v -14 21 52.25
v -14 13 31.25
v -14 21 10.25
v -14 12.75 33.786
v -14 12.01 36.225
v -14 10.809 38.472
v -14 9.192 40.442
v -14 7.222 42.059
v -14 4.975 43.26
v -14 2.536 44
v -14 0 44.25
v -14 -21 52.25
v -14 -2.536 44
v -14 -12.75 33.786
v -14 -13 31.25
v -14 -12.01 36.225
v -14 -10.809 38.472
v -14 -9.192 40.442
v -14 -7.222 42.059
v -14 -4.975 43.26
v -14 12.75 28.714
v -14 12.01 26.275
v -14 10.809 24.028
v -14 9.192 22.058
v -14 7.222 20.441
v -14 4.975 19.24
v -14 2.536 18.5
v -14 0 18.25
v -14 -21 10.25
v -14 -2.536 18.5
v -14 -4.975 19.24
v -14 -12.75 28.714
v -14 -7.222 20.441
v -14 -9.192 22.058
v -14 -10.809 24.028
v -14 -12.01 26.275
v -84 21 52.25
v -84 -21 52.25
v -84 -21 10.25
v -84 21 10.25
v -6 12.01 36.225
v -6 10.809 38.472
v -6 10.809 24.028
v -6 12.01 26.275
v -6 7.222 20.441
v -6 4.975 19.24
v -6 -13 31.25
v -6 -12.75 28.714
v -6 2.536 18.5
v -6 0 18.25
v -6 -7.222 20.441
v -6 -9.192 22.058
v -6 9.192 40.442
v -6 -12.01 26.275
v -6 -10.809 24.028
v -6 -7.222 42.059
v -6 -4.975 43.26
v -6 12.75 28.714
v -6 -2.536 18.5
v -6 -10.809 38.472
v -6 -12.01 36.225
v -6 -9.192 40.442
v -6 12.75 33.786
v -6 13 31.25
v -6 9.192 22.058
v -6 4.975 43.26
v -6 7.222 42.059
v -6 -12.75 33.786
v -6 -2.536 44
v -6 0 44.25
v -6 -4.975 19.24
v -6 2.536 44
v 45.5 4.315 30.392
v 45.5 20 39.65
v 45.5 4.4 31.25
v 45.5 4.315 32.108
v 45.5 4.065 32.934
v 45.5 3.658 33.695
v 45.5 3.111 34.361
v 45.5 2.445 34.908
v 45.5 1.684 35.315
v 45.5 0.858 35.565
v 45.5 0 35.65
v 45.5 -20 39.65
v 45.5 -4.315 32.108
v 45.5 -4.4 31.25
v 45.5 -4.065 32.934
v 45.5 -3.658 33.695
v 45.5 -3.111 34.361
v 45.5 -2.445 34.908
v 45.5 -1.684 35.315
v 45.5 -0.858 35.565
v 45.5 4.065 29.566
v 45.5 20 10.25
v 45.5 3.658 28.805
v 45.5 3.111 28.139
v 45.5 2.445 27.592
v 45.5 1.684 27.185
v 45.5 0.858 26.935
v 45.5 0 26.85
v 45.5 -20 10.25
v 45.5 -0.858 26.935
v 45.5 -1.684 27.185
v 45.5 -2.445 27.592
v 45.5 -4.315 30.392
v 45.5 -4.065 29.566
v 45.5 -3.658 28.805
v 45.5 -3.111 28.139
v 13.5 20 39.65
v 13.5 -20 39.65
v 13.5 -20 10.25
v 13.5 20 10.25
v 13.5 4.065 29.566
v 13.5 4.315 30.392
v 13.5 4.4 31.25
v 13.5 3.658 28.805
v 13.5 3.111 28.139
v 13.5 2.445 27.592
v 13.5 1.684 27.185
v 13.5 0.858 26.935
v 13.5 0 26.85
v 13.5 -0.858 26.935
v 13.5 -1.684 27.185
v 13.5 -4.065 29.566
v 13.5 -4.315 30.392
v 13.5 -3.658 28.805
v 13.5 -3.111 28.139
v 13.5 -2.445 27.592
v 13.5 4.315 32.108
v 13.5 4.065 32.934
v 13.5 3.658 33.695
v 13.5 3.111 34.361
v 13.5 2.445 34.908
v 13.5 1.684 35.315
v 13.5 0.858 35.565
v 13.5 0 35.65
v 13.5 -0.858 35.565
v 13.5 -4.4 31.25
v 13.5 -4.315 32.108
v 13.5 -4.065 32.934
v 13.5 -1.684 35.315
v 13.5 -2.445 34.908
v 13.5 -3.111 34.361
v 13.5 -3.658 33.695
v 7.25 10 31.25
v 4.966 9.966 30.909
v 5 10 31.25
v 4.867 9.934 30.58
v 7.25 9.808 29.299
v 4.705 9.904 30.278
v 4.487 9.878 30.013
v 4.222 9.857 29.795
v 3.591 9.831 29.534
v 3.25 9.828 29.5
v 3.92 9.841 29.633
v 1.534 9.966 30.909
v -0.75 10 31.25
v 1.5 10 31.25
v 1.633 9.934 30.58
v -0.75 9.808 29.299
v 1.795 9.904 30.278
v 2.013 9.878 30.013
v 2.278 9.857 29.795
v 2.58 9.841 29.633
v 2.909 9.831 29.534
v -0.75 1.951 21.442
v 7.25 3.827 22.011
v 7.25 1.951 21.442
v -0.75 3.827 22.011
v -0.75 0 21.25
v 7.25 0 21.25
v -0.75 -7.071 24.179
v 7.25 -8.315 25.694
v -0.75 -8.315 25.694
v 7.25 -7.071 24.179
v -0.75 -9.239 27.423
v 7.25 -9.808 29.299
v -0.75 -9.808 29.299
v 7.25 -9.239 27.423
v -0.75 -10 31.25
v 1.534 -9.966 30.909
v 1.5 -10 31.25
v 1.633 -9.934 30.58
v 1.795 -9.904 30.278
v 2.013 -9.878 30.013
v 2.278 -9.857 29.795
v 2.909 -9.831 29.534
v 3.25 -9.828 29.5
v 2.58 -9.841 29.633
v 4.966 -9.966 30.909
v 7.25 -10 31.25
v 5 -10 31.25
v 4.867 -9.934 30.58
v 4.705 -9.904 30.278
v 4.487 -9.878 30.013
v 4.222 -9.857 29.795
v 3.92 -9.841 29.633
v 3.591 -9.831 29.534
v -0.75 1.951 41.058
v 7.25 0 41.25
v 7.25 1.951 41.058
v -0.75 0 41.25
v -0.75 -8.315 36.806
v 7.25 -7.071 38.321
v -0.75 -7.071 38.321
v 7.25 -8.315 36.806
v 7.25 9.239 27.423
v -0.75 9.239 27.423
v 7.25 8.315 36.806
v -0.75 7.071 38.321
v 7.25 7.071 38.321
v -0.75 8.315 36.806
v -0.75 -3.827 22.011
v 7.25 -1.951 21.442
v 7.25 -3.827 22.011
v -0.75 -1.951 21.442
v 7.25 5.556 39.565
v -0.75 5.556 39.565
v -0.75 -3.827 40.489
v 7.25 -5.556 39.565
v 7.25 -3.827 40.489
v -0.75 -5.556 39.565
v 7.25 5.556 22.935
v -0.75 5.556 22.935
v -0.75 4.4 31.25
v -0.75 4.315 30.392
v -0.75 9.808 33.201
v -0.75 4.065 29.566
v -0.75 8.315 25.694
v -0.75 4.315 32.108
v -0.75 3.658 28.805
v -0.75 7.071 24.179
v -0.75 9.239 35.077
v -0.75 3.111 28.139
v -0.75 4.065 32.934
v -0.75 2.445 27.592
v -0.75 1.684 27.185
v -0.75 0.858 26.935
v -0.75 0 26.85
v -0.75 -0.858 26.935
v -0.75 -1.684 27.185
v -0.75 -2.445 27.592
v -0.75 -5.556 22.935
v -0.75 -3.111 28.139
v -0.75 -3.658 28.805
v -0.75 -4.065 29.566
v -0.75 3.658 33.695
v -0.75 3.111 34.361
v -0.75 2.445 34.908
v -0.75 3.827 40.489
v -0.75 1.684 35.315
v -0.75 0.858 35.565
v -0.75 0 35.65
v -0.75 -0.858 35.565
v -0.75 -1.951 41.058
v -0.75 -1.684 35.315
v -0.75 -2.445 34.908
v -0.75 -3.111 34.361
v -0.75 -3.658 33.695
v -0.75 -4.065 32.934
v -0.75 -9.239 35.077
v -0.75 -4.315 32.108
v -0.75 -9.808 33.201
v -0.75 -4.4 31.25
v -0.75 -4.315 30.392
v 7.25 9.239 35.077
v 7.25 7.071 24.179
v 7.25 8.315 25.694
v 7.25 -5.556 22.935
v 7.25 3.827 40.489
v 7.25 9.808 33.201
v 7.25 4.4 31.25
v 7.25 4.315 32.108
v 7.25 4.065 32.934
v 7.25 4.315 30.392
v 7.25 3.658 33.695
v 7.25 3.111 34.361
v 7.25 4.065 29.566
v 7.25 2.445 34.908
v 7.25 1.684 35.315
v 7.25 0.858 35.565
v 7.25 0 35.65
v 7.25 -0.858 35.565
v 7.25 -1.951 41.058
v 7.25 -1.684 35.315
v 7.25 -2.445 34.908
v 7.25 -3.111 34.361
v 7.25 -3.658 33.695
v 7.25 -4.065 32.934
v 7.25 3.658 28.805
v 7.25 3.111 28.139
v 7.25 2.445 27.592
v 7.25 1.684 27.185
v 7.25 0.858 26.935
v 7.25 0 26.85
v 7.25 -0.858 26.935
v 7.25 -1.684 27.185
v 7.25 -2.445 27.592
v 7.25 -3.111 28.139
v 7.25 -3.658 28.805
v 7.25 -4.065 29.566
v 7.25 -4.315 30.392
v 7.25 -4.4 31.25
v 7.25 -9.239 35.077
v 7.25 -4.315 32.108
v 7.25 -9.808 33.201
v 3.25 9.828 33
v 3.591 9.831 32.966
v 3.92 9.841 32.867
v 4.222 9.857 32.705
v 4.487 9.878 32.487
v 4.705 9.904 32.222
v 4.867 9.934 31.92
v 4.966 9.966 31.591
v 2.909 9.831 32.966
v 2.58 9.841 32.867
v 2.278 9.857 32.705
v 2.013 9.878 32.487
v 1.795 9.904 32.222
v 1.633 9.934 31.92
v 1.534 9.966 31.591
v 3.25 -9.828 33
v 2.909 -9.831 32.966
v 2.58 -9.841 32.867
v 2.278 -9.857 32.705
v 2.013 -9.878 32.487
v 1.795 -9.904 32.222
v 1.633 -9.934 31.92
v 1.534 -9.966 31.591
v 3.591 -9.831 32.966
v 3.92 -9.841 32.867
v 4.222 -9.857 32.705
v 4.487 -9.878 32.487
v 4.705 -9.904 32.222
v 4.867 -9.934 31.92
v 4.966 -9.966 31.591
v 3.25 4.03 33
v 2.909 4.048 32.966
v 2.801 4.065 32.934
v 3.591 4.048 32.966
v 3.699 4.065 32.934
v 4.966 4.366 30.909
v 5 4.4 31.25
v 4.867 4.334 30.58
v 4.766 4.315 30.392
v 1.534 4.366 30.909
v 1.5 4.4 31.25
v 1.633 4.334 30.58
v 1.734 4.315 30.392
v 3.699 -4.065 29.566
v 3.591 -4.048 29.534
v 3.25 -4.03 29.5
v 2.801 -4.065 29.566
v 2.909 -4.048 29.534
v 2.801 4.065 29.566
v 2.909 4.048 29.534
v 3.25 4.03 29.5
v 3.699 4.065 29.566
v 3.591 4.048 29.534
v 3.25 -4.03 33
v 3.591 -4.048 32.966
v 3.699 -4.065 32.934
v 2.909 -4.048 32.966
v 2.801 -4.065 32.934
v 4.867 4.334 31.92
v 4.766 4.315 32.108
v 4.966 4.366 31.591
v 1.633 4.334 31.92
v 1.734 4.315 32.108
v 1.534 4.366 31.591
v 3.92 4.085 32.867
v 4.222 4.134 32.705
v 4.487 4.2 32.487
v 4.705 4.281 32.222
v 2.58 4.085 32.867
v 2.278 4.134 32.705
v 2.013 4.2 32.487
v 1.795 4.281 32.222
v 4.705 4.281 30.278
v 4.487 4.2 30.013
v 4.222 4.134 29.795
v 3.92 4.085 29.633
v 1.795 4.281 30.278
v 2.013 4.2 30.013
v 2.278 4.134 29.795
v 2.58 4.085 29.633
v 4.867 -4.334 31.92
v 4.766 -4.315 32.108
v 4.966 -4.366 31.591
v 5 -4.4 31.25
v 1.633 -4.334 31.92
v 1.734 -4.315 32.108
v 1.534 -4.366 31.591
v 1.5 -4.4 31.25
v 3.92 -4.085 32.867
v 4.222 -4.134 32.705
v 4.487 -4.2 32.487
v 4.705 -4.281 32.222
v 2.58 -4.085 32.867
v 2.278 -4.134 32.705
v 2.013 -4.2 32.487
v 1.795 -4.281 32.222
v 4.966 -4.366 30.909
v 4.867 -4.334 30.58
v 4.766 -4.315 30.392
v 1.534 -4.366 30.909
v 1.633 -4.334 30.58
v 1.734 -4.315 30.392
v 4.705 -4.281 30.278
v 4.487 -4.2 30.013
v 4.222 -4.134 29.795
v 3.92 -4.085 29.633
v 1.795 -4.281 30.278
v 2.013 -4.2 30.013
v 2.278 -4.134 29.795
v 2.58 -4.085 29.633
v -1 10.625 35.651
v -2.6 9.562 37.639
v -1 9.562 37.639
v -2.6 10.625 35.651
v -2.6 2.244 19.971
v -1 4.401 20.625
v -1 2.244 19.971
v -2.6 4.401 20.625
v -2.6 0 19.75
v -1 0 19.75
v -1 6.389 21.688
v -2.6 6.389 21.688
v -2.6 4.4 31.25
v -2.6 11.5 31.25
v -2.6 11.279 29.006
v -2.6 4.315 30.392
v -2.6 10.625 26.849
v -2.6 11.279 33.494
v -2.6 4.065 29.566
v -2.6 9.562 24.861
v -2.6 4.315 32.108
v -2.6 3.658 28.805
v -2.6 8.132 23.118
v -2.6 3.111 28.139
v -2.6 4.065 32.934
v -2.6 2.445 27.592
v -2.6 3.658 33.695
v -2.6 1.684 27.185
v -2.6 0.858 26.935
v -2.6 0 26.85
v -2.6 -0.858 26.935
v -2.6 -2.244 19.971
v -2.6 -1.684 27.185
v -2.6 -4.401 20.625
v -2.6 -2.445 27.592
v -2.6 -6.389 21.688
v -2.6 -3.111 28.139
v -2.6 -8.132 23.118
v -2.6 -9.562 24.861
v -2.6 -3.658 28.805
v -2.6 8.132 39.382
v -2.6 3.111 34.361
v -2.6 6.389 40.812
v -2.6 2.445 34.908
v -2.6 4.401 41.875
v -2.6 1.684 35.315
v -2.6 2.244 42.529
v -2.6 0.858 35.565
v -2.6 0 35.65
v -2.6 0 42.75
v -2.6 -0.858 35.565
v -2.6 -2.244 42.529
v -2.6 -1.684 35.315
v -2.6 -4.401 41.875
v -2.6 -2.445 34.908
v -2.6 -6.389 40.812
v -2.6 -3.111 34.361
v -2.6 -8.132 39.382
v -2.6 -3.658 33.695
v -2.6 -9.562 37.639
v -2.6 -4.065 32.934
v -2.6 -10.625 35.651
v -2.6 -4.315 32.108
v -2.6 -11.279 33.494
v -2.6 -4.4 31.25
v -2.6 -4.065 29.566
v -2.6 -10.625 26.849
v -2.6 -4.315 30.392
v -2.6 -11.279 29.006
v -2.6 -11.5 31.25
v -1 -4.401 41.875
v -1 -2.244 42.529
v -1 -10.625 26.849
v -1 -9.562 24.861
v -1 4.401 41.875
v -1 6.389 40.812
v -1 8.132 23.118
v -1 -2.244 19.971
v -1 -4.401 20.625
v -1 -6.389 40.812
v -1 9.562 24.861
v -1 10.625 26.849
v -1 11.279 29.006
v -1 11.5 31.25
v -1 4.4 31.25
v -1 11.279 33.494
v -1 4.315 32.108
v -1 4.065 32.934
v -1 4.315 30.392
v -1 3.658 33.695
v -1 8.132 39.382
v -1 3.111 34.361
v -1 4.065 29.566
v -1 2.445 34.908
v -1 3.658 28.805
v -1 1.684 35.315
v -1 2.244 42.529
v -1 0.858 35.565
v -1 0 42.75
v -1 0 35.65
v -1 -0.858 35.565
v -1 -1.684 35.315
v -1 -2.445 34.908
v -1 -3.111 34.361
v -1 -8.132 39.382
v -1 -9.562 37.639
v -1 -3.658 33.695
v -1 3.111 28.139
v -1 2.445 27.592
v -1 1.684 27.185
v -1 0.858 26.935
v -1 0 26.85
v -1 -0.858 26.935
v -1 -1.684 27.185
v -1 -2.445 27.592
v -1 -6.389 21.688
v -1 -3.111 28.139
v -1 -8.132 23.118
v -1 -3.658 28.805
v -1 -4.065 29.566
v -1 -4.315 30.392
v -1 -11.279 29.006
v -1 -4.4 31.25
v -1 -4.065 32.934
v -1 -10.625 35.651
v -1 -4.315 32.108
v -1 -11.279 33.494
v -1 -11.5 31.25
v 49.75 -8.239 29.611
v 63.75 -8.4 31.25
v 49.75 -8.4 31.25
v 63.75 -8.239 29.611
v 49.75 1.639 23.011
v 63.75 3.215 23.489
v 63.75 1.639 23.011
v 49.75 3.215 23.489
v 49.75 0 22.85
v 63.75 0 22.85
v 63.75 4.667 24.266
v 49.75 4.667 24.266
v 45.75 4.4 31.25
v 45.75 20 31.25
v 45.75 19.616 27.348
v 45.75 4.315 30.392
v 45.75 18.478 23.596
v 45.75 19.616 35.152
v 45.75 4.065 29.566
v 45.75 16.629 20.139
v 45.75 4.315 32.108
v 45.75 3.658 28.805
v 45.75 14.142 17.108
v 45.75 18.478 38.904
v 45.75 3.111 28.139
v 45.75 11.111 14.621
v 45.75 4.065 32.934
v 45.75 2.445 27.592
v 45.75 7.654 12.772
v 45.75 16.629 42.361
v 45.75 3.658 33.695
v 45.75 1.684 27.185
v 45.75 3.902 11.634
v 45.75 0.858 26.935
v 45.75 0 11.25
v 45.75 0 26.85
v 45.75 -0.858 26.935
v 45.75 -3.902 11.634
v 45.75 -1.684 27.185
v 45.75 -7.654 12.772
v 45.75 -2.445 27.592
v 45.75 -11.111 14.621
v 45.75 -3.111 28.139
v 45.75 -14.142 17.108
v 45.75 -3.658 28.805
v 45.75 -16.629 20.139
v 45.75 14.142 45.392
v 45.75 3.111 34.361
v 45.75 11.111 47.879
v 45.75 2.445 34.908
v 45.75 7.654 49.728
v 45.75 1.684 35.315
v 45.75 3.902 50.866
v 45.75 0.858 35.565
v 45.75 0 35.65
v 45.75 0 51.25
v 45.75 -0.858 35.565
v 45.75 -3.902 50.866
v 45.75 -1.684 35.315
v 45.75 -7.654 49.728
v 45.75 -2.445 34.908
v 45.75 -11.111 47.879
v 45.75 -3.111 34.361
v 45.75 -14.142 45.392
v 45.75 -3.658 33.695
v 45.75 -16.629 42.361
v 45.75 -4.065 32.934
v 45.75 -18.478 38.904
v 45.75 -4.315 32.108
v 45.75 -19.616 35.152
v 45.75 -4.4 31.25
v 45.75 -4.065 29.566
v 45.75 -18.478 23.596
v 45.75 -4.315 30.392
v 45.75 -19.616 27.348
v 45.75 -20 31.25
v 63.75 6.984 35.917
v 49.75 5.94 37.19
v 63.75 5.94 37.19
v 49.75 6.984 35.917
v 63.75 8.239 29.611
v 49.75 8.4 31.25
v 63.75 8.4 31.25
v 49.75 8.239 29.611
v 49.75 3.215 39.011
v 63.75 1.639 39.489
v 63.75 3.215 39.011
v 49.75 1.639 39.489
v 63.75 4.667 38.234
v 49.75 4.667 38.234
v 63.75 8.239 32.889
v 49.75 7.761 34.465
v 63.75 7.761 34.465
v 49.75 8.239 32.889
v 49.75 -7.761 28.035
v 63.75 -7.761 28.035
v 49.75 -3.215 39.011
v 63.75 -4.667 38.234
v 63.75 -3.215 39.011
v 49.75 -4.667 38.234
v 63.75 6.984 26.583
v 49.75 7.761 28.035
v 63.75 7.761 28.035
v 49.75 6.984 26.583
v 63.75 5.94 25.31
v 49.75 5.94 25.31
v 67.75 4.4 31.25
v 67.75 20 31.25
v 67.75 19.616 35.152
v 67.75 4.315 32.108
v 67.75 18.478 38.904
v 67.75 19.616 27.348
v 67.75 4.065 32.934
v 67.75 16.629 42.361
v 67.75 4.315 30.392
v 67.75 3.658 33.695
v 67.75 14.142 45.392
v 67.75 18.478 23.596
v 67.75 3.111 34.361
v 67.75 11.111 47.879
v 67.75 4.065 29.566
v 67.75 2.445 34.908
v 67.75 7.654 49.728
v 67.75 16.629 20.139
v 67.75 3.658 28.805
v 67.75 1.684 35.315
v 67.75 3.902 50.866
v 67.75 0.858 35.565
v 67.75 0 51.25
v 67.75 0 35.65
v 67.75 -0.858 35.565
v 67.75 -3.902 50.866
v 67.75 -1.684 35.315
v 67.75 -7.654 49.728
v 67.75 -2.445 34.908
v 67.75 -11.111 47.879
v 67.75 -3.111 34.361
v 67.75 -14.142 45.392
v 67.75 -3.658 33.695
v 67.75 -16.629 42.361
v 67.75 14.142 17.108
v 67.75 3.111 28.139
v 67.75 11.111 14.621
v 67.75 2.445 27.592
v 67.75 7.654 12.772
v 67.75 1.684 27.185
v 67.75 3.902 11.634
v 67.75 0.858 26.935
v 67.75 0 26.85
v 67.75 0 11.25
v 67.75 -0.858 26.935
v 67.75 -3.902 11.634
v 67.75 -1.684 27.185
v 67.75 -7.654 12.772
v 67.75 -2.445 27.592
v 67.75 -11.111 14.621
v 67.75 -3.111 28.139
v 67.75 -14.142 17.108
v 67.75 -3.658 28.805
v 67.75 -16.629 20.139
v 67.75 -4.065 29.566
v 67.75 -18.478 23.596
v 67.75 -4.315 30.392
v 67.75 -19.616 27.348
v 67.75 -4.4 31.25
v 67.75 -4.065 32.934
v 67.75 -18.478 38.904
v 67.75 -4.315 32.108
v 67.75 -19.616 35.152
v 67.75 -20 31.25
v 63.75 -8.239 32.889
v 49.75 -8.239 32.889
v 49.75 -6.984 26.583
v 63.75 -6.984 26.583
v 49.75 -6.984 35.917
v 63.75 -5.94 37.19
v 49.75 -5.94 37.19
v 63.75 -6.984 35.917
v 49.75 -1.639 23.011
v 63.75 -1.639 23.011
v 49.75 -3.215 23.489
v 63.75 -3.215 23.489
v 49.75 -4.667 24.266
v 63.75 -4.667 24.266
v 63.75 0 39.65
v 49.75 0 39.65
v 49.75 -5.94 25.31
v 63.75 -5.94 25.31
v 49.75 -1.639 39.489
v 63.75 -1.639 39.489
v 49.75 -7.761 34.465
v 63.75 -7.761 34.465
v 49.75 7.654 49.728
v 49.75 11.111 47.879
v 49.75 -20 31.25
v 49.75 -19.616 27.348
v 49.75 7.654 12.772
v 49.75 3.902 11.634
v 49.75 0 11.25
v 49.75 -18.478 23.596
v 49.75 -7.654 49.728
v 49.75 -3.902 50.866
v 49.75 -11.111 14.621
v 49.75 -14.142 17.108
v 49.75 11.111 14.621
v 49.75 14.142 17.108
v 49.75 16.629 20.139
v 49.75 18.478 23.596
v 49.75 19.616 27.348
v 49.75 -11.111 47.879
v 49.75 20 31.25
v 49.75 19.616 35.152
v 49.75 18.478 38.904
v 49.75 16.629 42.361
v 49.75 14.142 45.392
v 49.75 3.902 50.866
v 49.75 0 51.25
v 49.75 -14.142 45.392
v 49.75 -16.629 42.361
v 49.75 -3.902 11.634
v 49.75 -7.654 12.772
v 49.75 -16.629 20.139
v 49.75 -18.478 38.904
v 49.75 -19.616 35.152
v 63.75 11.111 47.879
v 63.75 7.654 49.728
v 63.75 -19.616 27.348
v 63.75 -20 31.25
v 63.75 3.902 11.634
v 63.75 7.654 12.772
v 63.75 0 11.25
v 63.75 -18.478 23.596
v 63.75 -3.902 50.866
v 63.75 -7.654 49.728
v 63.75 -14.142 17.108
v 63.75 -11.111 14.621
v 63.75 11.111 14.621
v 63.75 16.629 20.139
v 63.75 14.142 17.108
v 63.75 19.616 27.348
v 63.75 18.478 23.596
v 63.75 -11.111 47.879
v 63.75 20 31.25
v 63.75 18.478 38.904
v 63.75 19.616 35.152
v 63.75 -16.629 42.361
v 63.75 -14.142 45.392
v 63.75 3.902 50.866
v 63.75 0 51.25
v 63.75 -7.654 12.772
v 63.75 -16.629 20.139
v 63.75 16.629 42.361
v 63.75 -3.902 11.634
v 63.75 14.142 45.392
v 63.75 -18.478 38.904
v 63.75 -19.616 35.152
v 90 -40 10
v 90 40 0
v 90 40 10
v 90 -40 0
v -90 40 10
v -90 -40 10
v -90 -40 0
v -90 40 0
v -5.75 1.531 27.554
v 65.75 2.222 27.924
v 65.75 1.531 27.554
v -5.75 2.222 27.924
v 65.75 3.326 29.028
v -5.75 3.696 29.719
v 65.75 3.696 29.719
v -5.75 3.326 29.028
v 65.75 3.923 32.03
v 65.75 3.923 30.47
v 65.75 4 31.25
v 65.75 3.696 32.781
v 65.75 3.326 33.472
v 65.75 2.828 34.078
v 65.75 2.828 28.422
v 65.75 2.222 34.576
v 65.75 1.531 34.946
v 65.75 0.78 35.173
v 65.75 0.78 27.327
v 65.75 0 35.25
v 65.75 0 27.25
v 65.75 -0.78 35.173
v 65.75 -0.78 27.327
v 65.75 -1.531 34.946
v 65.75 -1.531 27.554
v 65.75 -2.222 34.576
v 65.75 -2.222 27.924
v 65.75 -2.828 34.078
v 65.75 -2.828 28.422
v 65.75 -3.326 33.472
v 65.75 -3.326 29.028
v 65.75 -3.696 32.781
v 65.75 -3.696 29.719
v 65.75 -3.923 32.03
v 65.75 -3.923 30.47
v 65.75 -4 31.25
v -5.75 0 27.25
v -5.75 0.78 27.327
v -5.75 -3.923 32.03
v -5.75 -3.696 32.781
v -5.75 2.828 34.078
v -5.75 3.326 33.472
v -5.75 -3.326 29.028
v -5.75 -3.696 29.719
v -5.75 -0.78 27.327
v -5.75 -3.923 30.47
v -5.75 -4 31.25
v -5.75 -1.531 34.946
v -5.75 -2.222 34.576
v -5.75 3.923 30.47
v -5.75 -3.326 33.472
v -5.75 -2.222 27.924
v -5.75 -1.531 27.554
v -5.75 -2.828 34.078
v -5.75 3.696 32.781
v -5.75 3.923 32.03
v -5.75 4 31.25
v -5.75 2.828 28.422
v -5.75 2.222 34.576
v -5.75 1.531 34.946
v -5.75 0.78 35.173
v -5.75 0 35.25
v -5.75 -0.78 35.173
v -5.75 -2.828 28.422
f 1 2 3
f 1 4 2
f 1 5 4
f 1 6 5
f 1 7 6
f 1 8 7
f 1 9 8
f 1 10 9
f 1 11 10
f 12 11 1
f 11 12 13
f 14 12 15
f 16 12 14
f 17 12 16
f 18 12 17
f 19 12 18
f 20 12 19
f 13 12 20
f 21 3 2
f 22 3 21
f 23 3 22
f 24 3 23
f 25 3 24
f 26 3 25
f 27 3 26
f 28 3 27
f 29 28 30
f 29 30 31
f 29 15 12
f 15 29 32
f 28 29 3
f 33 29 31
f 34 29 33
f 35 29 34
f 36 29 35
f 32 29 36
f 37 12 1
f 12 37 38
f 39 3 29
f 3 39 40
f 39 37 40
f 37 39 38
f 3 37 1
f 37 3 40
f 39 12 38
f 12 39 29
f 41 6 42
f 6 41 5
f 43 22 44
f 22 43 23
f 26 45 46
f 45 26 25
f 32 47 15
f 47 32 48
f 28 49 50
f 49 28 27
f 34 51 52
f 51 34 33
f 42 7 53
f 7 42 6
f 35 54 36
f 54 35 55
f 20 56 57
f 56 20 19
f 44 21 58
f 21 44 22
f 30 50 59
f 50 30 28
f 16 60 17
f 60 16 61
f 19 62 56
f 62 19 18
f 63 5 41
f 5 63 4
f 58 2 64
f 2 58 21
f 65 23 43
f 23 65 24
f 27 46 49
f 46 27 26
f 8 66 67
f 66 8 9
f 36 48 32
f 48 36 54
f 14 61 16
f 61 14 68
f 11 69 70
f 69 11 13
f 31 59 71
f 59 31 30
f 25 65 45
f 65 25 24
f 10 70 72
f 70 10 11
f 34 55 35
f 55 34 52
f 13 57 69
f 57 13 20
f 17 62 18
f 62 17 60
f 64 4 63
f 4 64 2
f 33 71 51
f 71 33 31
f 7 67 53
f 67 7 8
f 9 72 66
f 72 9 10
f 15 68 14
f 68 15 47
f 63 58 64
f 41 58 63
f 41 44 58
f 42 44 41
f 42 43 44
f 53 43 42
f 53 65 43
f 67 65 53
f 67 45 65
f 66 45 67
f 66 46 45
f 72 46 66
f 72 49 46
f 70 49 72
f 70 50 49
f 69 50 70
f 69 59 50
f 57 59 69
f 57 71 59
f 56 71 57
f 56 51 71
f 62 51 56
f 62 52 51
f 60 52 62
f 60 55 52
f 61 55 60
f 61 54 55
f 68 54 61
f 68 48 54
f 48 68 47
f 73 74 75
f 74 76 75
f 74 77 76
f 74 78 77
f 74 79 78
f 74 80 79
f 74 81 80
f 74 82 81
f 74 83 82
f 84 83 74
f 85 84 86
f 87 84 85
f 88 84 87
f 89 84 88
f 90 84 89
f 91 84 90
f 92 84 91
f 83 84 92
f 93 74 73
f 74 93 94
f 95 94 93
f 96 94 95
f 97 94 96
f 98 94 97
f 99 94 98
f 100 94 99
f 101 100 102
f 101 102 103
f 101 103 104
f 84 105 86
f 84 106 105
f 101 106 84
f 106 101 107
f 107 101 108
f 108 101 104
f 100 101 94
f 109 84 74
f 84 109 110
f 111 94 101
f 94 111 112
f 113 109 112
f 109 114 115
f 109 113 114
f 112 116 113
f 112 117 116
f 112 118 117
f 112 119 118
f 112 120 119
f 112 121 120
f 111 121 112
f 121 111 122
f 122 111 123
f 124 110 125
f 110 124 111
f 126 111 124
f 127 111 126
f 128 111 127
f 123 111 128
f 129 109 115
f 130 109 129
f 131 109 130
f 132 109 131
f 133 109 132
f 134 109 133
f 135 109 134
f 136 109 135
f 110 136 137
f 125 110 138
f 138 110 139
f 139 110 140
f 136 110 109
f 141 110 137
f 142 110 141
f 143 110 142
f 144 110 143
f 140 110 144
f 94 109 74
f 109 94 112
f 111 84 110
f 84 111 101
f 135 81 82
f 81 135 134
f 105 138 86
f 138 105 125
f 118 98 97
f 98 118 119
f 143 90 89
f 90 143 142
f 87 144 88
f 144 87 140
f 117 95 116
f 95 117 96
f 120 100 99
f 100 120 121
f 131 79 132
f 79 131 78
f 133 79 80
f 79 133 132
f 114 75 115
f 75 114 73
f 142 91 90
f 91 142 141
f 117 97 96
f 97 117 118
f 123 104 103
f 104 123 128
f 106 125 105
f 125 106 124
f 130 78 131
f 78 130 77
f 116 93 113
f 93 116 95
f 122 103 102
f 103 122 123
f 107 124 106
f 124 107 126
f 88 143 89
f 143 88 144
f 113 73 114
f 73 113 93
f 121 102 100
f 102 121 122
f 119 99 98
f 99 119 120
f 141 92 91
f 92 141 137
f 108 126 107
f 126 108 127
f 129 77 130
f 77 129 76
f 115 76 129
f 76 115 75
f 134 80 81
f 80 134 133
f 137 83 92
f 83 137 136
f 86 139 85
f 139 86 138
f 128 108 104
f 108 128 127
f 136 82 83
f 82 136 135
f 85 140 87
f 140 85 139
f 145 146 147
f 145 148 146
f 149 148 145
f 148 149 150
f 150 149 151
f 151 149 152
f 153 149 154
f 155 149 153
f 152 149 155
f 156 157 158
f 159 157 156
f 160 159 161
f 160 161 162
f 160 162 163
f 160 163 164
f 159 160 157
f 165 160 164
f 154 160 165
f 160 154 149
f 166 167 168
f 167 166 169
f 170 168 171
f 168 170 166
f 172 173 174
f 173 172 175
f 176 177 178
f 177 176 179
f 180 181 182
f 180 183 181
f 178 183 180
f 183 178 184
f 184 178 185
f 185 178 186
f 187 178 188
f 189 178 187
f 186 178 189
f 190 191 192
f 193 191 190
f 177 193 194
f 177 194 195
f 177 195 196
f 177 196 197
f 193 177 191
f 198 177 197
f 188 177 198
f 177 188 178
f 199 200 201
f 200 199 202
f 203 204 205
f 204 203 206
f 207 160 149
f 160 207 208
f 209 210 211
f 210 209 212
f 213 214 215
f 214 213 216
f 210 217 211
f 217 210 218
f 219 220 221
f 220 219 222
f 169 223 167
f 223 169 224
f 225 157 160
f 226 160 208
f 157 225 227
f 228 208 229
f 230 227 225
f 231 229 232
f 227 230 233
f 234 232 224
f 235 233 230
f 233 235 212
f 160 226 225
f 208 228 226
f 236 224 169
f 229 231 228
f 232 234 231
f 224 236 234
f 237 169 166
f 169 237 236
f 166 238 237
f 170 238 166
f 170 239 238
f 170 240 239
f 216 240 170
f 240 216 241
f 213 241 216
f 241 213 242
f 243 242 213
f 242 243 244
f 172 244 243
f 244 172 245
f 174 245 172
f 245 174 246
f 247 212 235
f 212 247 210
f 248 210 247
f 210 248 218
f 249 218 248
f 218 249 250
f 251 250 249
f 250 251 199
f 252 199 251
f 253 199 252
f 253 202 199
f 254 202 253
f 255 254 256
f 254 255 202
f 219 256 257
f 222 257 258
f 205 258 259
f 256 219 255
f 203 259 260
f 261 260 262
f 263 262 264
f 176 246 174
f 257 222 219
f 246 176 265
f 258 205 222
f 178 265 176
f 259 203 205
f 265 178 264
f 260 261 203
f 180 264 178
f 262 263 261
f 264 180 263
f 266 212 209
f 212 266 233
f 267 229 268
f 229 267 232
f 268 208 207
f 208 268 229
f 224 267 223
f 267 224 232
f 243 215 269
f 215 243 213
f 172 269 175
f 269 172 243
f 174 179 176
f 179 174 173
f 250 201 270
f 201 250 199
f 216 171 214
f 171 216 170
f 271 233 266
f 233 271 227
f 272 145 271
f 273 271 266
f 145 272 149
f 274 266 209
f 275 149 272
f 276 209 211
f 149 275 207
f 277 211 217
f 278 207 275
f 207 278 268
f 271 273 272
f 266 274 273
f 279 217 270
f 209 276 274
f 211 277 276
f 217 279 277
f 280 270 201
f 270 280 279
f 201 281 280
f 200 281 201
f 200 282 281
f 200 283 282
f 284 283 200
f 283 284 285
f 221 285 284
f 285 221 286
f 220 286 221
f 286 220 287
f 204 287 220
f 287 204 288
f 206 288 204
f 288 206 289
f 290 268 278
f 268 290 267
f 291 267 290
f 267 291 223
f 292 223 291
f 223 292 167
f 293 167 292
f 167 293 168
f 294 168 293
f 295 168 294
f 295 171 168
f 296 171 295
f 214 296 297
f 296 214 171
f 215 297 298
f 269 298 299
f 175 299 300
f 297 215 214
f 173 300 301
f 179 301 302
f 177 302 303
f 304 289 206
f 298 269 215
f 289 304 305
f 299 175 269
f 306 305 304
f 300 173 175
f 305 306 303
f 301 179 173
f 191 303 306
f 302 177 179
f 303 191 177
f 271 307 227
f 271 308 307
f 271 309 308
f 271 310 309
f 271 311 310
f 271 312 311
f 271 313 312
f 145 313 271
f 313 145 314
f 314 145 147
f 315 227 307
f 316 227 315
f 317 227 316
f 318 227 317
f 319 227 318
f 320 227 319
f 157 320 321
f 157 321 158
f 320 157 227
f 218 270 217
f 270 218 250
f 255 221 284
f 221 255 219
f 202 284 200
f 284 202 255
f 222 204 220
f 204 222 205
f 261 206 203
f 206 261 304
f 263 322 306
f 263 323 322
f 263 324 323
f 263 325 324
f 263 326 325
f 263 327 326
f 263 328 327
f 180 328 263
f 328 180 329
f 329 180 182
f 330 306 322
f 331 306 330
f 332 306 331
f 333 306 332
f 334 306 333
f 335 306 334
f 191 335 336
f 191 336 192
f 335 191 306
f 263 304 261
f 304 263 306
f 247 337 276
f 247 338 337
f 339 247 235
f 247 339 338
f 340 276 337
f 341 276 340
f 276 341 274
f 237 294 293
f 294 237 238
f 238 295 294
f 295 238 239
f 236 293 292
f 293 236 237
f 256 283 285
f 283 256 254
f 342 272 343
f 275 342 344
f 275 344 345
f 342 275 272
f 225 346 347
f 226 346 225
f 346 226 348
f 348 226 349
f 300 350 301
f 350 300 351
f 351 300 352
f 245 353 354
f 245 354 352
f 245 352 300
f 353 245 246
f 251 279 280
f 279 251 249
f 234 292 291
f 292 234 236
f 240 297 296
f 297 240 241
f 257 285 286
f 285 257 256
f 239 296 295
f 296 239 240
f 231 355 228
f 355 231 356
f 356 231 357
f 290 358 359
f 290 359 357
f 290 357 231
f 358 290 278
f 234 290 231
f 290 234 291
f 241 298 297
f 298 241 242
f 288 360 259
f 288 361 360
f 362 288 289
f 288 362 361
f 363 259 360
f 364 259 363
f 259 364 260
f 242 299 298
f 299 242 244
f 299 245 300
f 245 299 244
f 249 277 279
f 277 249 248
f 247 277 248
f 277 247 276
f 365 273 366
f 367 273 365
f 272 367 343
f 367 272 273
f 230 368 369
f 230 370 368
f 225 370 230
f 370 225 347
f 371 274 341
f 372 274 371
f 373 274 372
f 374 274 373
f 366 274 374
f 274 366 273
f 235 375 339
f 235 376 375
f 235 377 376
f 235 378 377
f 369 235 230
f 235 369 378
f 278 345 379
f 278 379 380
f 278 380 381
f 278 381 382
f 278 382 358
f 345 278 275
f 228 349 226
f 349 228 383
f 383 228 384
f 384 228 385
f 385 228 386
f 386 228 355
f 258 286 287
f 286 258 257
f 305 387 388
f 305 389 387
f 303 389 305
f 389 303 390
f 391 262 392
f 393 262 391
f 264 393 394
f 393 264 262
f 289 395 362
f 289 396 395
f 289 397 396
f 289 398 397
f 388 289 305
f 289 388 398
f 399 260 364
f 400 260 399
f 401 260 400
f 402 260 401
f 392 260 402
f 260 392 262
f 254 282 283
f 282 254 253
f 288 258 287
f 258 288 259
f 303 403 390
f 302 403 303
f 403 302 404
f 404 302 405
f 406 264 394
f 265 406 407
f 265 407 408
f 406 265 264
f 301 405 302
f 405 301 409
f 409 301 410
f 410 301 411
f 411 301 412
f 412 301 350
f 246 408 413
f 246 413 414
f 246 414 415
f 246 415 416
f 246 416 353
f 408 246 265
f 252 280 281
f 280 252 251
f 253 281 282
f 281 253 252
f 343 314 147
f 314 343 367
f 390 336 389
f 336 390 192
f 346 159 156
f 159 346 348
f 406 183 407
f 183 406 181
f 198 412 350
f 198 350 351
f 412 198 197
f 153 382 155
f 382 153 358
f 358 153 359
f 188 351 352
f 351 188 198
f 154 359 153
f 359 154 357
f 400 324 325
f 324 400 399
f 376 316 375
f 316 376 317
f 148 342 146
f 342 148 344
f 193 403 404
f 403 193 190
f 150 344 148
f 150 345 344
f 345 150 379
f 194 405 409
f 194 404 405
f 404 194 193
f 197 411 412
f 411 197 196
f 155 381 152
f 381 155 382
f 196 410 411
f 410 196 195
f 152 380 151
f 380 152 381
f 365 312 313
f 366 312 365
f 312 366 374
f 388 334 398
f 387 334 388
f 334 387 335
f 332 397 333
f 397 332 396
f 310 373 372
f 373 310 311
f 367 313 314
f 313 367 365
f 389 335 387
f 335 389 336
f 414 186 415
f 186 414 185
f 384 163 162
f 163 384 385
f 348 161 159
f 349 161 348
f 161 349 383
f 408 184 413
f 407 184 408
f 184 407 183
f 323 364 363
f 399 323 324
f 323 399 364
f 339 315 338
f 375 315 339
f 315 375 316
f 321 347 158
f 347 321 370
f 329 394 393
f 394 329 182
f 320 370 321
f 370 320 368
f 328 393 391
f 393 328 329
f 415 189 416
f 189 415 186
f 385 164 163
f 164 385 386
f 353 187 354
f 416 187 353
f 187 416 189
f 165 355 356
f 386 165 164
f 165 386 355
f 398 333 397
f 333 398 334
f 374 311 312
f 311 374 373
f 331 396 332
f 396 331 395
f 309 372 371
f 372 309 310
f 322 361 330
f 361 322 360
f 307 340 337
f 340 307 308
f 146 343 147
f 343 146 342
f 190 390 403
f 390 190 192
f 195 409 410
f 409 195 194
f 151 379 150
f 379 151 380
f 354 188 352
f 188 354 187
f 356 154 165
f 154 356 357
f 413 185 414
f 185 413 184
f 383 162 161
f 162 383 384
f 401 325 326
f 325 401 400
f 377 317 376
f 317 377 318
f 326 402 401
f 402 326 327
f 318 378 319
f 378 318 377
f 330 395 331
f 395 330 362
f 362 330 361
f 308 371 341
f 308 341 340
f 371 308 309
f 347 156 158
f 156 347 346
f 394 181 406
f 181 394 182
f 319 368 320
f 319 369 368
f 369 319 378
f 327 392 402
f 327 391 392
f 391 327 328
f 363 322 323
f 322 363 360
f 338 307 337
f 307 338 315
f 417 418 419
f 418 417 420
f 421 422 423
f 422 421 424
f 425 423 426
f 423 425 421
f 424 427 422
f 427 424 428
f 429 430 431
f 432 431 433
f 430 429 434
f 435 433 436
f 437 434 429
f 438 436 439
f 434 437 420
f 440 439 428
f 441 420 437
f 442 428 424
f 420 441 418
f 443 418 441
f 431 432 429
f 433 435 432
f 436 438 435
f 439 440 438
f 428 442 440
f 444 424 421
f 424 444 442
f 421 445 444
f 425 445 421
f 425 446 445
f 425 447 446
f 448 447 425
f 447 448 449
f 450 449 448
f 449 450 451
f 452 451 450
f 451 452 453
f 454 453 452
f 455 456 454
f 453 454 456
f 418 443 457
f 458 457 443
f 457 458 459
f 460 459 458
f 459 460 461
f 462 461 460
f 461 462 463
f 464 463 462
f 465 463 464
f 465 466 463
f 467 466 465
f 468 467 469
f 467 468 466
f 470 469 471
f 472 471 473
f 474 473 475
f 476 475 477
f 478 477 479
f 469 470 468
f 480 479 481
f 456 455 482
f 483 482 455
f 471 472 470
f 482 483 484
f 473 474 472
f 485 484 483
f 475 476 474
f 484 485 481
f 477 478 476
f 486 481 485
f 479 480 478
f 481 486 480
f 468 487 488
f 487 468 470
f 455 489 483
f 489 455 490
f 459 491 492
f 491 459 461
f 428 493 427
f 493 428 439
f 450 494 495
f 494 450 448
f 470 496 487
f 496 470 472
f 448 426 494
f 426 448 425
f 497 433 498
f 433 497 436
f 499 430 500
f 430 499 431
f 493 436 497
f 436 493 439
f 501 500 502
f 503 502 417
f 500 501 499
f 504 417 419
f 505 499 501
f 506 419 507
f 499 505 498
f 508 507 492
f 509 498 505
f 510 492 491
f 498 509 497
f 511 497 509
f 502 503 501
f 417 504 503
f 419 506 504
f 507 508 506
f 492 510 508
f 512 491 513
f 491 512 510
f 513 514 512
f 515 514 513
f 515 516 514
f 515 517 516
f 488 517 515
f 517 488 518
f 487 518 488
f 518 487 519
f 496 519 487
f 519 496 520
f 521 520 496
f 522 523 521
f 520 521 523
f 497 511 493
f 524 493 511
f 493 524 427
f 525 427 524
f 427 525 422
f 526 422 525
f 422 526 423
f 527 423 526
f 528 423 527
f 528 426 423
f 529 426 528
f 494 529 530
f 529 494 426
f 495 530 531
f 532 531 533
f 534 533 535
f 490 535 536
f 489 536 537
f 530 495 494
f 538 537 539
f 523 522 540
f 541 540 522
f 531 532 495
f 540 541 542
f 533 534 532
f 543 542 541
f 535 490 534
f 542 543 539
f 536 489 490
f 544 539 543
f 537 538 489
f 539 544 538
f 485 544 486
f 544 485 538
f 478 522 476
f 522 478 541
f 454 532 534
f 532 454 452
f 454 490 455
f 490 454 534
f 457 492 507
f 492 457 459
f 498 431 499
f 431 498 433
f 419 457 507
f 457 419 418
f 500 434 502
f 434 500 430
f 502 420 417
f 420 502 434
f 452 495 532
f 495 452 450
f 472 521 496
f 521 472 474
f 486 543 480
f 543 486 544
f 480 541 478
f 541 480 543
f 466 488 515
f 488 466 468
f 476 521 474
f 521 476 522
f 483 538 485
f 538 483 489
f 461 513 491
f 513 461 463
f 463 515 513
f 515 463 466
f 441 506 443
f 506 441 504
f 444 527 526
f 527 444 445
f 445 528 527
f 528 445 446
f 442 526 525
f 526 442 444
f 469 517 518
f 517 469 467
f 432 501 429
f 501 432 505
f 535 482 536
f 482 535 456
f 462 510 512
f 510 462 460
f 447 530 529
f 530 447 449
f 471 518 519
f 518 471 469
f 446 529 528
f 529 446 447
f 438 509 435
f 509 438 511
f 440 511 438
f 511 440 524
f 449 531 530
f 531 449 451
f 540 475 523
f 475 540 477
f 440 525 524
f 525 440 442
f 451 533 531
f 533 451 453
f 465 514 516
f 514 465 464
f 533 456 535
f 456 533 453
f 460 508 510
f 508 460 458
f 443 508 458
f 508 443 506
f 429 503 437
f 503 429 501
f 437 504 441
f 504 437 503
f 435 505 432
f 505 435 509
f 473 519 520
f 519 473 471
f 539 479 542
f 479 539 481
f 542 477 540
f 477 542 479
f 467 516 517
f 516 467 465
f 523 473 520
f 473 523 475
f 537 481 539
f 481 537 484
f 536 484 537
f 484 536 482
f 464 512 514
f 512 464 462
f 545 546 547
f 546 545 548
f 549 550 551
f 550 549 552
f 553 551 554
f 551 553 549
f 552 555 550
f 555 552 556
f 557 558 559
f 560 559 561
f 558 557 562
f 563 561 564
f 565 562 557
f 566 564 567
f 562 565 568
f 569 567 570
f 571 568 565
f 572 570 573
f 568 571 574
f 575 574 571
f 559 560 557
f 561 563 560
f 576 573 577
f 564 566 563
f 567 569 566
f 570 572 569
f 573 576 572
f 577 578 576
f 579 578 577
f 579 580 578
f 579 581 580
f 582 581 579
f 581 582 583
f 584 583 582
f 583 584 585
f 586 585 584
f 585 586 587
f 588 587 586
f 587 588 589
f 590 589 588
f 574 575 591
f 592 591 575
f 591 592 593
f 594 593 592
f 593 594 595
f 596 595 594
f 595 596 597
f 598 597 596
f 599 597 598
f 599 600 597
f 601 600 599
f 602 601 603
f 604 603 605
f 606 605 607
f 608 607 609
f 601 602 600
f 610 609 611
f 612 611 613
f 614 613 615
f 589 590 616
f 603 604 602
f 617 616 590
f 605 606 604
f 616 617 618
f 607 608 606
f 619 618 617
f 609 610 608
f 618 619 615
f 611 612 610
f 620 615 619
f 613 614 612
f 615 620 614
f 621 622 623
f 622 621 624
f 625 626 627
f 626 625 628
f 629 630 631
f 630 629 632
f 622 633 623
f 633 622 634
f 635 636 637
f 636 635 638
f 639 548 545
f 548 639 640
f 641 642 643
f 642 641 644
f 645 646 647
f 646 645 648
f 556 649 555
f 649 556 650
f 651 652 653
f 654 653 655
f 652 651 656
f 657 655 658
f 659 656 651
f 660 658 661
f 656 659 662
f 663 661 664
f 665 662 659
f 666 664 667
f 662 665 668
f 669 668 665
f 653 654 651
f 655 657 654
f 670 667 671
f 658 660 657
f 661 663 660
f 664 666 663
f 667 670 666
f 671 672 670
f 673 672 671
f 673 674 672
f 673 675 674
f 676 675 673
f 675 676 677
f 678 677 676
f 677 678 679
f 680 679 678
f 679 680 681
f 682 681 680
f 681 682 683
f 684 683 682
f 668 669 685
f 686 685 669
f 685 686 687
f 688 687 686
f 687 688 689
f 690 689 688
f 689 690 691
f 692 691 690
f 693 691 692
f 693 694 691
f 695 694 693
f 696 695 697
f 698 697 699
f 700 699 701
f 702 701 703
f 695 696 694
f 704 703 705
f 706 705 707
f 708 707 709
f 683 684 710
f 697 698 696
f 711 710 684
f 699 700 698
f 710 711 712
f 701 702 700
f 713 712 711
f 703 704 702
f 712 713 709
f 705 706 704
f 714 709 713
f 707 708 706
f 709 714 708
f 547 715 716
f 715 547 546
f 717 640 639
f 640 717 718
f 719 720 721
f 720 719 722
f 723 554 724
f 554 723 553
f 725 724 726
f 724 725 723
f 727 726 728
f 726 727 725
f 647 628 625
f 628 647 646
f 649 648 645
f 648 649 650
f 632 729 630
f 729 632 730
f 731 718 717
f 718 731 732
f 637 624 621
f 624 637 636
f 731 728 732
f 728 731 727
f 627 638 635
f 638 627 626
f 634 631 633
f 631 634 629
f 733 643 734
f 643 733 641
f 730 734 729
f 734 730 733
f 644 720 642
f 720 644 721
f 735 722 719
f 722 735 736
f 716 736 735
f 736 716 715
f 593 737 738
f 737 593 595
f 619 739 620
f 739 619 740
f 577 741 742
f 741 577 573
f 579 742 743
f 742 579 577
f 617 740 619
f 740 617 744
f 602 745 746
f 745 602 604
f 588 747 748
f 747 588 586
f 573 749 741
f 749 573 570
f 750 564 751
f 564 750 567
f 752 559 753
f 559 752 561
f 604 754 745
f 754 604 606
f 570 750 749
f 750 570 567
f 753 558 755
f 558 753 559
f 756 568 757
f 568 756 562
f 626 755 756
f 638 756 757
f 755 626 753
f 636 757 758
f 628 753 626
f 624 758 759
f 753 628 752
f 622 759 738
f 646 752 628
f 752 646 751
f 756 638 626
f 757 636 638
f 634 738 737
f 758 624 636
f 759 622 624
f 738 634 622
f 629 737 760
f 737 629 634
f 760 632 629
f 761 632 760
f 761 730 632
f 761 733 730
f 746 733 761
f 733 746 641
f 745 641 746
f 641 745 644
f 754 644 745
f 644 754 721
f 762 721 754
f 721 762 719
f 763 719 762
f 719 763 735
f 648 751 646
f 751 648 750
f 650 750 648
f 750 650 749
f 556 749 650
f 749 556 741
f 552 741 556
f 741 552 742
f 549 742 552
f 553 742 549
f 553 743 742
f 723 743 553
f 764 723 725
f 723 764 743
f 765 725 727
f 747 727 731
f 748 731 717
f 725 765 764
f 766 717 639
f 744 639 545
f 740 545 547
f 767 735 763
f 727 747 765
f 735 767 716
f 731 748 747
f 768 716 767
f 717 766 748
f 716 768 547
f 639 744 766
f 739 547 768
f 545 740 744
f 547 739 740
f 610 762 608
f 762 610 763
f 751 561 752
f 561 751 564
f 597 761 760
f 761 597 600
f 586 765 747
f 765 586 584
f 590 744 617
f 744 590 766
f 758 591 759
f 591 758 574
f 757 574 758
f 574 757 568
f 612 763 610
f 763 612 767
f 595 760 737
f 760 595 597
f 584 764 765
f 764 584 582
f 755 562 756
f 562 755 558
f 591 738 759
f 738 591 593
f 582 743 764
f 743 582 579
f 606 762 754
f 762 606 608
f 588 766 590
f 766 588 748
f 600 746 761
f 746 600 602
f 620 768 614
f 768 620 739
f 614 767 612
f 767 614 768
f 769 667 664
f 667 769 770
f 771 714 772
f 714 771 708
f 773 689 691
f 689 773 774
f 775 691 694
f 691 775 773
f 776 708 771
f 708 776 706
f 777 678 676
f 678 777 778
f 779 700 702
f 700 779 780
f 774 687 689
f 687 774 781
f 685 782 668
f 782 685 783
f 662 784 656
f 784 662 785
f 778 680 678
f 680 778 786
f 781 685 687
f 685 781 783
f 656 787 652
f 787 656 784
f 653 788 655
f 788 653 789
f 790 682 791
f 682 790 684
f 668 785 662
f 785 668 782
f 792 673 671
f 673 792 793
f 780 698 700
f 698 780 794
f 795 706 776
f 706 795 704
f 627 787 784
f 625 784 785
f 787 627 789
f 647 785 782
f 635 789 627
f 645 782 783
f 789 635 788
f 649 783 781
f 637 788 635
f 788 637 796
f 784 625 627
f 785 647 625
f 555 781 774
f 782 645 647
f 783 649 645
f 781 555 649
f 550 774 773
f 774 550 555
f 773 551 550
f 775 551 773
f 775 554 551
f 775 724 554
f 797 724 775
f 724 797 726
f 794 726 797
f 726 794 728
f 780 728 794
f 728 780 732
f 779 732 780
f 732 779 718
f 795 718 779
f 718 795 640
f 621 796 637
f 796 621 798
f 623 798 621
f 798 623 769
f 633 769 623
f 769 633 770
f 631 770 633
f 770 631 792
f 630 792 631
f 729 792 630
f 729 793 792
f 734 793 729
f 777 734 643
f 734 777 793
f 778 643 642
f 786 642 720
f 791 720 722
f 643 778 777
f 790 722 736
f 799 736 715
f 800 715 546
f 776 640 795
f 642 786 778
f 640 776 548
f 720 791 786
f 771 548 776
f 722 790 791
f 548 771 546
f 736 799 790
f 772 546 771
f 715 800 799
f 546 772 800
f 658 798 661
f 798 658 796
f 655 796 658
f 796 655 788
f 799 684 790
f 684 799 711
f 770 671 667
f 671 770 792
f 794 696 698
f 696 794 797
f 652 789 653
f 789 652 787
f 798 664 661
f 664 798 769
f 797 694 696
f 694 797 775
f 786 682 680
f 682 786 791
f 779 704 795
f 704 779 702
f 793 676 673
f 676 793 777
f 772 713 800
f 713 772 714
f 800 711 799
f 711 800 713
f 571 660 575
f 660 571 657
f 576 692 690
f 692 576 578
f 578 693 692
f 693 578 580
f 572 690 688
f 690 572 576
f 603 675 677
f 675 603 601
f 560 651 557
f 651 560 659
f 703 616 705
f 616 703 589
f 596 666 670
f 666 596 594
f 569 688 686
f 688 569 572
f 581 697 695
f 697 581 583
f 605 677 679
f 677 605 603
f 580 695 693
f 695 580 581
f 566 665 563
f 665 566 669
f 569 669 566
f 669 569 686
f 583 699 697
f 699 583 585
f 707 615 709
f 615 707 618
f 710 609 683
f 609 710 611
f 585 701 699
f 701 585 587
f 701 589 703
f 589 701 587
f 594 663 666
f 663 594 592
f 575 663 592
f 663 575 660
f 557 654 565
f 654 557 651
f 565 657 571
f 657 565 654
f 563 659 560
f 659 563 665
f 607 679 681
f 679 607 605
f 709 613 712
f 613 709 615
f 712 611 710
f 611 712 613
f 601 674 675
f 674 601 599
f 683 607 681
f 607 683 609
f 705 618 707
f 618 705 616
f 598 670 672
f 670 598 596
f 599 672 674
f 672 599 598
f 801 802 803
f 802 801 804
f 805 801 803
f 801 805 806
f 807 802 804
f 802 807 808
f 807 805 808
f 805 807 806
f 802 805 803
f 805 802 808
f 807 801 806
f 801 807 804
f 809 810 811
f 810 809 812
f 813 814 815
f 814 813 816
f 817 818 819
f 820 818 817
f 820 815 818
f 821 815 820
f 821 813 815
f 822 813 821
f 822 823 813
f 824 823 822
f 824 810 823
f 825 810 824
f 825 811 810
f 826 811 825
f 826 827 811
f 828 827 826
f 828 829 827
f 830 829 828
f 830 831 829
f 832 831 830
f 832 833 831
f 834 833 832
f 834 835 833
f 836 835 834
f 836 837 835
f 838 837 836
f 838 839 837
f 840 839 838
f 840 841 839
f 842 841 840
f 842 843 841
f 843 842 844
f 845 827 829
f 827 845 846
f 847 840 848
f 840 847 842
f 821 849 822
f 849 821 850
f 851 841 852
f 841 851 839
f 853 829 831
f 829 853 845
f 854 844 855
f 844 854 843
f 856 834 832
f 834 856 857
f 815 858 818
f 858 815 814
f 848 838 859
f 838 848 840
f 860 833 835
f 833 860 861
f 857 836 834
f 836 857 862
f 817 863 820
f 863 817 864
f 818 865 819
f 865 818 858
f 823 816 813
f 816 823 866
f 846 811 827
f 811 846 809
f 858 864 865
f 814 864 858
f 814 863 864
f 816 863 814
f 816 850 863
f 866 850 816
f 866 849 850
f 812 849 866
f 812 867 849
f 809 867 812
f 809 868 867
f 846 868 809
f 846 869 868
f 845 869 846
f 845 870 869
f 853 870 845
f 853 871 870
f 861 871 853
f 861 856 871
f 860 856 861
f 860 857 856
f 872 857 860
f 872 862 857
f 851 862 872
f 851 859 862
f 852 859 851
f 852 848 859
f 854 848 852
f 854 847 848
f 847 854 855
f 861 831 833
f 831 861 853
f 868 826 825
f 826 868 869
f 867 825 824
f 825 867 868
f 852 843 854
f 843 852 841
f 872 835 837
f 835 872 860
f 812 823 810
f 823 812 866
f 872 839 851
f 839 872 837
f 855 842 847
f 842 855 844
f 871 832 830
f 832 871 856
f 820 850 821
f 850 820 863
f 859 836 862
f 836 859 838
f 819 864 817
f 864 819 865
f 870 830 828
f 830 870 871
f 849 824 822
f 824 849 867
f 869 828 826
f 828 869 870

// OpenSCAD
$fn = 32;

// ------------------------------------------------------------------------
// Motor drive station: motor 70 x 42 mm, shaft d8, pulley d40
// Every part is its own module, assembly() places every instance.
// ------------------------------------------------------------------------

// --- part 1 ---
module station_bed() {
  difference() {
    translate([-90, -40, 0]) cube([180, 80, 10]);
  }
}

// --- part 2 ---
module drive_motor() {
  union() {
    translate([-35, -21, 0]) cube([70, 42, 42]);
    translate([39, 0, 21]) rotate([0, 90, 0]) cylinder(h = 8, d = 26, center = true);
  }
}

// --- part 3 ---
module pillow_block() {
  difference() {
    translate([-16, -20, 0]) cube([32, 40, 29.4]);
    translate([0, 0, 21]) rotate([0, 90, 0]) cylinder(h = 34, d = 8.8, center = true);
  }
}

// --- part 4 ---
module drive_shaft() {
  translate([0, 0, -35.75]) cylinder(h = 71.5, d = 8);
}

// --- part 5 ---
module shaft_collar() {
  difference() {
    cylinder(h = 8, d = 20);
    translate([0, 0, -1]) cylinder(h = 10, d = 8.8);
    translate([0, 0, 4]) rotate([90, 0, 0]) cylinder(h = 22, d = 3.5, center = true);
  }
}

// --- part 6 ---
module collar_washer() {
  difference() {
      translate([0, 0, 0]) cylinder(h = 1.6, d = 23);
      translate([0, 0, -1]) cylinder(h = 3.6, d = 8.8);
    }
}

// --- part 7 ---
module drive_pulley() {
  difference() {
    union() {
      cylinder(h = 22, d = 16.8);
      cylinder(h = 4, d = 40);
      translate([0, 0, 18]) cylinder(h = 4, d = 40);
    }
    translate([0, 0, -1]) cylinder(h = 24, d = 8.8);
  }
}

// --- assembly ---
module assembly() {
  color([0.80, 0.24, 0.20]) translate([0, 0, 0]) rotate([0, 0, 0]) station_bed();
  color([0.20, 0.45, 0.75]) translate([-49, 0, 10.25]) rotate([0, 0, 0]) drive_motor();
  color([0.25, 0.62, 0.32]) translate([29.5, 0, 10.25]) rotate([0, 0, 0]) pillow_block();
  color([0.92, 0.70, 0.18]) translate([30, 0, 31.25]) rotate([0, 90, 0]) drive_shaft();
  color([0.58, 0.35, 0.70]) translate([-0.75, 0, 31.25]) rotate([0, 90, 0]) shaft_collar();
  color([0.16, 0.66, 0.66]) translate([-2.6, 0, 31.25]) rotate([0, 90, 0]) collar_washer();
  color([0.85, 0.48, 0.18]) translate([45.75, 0, 31.25]) rotate([0, 90, 0]) drive_pulley();
}

assembly();
